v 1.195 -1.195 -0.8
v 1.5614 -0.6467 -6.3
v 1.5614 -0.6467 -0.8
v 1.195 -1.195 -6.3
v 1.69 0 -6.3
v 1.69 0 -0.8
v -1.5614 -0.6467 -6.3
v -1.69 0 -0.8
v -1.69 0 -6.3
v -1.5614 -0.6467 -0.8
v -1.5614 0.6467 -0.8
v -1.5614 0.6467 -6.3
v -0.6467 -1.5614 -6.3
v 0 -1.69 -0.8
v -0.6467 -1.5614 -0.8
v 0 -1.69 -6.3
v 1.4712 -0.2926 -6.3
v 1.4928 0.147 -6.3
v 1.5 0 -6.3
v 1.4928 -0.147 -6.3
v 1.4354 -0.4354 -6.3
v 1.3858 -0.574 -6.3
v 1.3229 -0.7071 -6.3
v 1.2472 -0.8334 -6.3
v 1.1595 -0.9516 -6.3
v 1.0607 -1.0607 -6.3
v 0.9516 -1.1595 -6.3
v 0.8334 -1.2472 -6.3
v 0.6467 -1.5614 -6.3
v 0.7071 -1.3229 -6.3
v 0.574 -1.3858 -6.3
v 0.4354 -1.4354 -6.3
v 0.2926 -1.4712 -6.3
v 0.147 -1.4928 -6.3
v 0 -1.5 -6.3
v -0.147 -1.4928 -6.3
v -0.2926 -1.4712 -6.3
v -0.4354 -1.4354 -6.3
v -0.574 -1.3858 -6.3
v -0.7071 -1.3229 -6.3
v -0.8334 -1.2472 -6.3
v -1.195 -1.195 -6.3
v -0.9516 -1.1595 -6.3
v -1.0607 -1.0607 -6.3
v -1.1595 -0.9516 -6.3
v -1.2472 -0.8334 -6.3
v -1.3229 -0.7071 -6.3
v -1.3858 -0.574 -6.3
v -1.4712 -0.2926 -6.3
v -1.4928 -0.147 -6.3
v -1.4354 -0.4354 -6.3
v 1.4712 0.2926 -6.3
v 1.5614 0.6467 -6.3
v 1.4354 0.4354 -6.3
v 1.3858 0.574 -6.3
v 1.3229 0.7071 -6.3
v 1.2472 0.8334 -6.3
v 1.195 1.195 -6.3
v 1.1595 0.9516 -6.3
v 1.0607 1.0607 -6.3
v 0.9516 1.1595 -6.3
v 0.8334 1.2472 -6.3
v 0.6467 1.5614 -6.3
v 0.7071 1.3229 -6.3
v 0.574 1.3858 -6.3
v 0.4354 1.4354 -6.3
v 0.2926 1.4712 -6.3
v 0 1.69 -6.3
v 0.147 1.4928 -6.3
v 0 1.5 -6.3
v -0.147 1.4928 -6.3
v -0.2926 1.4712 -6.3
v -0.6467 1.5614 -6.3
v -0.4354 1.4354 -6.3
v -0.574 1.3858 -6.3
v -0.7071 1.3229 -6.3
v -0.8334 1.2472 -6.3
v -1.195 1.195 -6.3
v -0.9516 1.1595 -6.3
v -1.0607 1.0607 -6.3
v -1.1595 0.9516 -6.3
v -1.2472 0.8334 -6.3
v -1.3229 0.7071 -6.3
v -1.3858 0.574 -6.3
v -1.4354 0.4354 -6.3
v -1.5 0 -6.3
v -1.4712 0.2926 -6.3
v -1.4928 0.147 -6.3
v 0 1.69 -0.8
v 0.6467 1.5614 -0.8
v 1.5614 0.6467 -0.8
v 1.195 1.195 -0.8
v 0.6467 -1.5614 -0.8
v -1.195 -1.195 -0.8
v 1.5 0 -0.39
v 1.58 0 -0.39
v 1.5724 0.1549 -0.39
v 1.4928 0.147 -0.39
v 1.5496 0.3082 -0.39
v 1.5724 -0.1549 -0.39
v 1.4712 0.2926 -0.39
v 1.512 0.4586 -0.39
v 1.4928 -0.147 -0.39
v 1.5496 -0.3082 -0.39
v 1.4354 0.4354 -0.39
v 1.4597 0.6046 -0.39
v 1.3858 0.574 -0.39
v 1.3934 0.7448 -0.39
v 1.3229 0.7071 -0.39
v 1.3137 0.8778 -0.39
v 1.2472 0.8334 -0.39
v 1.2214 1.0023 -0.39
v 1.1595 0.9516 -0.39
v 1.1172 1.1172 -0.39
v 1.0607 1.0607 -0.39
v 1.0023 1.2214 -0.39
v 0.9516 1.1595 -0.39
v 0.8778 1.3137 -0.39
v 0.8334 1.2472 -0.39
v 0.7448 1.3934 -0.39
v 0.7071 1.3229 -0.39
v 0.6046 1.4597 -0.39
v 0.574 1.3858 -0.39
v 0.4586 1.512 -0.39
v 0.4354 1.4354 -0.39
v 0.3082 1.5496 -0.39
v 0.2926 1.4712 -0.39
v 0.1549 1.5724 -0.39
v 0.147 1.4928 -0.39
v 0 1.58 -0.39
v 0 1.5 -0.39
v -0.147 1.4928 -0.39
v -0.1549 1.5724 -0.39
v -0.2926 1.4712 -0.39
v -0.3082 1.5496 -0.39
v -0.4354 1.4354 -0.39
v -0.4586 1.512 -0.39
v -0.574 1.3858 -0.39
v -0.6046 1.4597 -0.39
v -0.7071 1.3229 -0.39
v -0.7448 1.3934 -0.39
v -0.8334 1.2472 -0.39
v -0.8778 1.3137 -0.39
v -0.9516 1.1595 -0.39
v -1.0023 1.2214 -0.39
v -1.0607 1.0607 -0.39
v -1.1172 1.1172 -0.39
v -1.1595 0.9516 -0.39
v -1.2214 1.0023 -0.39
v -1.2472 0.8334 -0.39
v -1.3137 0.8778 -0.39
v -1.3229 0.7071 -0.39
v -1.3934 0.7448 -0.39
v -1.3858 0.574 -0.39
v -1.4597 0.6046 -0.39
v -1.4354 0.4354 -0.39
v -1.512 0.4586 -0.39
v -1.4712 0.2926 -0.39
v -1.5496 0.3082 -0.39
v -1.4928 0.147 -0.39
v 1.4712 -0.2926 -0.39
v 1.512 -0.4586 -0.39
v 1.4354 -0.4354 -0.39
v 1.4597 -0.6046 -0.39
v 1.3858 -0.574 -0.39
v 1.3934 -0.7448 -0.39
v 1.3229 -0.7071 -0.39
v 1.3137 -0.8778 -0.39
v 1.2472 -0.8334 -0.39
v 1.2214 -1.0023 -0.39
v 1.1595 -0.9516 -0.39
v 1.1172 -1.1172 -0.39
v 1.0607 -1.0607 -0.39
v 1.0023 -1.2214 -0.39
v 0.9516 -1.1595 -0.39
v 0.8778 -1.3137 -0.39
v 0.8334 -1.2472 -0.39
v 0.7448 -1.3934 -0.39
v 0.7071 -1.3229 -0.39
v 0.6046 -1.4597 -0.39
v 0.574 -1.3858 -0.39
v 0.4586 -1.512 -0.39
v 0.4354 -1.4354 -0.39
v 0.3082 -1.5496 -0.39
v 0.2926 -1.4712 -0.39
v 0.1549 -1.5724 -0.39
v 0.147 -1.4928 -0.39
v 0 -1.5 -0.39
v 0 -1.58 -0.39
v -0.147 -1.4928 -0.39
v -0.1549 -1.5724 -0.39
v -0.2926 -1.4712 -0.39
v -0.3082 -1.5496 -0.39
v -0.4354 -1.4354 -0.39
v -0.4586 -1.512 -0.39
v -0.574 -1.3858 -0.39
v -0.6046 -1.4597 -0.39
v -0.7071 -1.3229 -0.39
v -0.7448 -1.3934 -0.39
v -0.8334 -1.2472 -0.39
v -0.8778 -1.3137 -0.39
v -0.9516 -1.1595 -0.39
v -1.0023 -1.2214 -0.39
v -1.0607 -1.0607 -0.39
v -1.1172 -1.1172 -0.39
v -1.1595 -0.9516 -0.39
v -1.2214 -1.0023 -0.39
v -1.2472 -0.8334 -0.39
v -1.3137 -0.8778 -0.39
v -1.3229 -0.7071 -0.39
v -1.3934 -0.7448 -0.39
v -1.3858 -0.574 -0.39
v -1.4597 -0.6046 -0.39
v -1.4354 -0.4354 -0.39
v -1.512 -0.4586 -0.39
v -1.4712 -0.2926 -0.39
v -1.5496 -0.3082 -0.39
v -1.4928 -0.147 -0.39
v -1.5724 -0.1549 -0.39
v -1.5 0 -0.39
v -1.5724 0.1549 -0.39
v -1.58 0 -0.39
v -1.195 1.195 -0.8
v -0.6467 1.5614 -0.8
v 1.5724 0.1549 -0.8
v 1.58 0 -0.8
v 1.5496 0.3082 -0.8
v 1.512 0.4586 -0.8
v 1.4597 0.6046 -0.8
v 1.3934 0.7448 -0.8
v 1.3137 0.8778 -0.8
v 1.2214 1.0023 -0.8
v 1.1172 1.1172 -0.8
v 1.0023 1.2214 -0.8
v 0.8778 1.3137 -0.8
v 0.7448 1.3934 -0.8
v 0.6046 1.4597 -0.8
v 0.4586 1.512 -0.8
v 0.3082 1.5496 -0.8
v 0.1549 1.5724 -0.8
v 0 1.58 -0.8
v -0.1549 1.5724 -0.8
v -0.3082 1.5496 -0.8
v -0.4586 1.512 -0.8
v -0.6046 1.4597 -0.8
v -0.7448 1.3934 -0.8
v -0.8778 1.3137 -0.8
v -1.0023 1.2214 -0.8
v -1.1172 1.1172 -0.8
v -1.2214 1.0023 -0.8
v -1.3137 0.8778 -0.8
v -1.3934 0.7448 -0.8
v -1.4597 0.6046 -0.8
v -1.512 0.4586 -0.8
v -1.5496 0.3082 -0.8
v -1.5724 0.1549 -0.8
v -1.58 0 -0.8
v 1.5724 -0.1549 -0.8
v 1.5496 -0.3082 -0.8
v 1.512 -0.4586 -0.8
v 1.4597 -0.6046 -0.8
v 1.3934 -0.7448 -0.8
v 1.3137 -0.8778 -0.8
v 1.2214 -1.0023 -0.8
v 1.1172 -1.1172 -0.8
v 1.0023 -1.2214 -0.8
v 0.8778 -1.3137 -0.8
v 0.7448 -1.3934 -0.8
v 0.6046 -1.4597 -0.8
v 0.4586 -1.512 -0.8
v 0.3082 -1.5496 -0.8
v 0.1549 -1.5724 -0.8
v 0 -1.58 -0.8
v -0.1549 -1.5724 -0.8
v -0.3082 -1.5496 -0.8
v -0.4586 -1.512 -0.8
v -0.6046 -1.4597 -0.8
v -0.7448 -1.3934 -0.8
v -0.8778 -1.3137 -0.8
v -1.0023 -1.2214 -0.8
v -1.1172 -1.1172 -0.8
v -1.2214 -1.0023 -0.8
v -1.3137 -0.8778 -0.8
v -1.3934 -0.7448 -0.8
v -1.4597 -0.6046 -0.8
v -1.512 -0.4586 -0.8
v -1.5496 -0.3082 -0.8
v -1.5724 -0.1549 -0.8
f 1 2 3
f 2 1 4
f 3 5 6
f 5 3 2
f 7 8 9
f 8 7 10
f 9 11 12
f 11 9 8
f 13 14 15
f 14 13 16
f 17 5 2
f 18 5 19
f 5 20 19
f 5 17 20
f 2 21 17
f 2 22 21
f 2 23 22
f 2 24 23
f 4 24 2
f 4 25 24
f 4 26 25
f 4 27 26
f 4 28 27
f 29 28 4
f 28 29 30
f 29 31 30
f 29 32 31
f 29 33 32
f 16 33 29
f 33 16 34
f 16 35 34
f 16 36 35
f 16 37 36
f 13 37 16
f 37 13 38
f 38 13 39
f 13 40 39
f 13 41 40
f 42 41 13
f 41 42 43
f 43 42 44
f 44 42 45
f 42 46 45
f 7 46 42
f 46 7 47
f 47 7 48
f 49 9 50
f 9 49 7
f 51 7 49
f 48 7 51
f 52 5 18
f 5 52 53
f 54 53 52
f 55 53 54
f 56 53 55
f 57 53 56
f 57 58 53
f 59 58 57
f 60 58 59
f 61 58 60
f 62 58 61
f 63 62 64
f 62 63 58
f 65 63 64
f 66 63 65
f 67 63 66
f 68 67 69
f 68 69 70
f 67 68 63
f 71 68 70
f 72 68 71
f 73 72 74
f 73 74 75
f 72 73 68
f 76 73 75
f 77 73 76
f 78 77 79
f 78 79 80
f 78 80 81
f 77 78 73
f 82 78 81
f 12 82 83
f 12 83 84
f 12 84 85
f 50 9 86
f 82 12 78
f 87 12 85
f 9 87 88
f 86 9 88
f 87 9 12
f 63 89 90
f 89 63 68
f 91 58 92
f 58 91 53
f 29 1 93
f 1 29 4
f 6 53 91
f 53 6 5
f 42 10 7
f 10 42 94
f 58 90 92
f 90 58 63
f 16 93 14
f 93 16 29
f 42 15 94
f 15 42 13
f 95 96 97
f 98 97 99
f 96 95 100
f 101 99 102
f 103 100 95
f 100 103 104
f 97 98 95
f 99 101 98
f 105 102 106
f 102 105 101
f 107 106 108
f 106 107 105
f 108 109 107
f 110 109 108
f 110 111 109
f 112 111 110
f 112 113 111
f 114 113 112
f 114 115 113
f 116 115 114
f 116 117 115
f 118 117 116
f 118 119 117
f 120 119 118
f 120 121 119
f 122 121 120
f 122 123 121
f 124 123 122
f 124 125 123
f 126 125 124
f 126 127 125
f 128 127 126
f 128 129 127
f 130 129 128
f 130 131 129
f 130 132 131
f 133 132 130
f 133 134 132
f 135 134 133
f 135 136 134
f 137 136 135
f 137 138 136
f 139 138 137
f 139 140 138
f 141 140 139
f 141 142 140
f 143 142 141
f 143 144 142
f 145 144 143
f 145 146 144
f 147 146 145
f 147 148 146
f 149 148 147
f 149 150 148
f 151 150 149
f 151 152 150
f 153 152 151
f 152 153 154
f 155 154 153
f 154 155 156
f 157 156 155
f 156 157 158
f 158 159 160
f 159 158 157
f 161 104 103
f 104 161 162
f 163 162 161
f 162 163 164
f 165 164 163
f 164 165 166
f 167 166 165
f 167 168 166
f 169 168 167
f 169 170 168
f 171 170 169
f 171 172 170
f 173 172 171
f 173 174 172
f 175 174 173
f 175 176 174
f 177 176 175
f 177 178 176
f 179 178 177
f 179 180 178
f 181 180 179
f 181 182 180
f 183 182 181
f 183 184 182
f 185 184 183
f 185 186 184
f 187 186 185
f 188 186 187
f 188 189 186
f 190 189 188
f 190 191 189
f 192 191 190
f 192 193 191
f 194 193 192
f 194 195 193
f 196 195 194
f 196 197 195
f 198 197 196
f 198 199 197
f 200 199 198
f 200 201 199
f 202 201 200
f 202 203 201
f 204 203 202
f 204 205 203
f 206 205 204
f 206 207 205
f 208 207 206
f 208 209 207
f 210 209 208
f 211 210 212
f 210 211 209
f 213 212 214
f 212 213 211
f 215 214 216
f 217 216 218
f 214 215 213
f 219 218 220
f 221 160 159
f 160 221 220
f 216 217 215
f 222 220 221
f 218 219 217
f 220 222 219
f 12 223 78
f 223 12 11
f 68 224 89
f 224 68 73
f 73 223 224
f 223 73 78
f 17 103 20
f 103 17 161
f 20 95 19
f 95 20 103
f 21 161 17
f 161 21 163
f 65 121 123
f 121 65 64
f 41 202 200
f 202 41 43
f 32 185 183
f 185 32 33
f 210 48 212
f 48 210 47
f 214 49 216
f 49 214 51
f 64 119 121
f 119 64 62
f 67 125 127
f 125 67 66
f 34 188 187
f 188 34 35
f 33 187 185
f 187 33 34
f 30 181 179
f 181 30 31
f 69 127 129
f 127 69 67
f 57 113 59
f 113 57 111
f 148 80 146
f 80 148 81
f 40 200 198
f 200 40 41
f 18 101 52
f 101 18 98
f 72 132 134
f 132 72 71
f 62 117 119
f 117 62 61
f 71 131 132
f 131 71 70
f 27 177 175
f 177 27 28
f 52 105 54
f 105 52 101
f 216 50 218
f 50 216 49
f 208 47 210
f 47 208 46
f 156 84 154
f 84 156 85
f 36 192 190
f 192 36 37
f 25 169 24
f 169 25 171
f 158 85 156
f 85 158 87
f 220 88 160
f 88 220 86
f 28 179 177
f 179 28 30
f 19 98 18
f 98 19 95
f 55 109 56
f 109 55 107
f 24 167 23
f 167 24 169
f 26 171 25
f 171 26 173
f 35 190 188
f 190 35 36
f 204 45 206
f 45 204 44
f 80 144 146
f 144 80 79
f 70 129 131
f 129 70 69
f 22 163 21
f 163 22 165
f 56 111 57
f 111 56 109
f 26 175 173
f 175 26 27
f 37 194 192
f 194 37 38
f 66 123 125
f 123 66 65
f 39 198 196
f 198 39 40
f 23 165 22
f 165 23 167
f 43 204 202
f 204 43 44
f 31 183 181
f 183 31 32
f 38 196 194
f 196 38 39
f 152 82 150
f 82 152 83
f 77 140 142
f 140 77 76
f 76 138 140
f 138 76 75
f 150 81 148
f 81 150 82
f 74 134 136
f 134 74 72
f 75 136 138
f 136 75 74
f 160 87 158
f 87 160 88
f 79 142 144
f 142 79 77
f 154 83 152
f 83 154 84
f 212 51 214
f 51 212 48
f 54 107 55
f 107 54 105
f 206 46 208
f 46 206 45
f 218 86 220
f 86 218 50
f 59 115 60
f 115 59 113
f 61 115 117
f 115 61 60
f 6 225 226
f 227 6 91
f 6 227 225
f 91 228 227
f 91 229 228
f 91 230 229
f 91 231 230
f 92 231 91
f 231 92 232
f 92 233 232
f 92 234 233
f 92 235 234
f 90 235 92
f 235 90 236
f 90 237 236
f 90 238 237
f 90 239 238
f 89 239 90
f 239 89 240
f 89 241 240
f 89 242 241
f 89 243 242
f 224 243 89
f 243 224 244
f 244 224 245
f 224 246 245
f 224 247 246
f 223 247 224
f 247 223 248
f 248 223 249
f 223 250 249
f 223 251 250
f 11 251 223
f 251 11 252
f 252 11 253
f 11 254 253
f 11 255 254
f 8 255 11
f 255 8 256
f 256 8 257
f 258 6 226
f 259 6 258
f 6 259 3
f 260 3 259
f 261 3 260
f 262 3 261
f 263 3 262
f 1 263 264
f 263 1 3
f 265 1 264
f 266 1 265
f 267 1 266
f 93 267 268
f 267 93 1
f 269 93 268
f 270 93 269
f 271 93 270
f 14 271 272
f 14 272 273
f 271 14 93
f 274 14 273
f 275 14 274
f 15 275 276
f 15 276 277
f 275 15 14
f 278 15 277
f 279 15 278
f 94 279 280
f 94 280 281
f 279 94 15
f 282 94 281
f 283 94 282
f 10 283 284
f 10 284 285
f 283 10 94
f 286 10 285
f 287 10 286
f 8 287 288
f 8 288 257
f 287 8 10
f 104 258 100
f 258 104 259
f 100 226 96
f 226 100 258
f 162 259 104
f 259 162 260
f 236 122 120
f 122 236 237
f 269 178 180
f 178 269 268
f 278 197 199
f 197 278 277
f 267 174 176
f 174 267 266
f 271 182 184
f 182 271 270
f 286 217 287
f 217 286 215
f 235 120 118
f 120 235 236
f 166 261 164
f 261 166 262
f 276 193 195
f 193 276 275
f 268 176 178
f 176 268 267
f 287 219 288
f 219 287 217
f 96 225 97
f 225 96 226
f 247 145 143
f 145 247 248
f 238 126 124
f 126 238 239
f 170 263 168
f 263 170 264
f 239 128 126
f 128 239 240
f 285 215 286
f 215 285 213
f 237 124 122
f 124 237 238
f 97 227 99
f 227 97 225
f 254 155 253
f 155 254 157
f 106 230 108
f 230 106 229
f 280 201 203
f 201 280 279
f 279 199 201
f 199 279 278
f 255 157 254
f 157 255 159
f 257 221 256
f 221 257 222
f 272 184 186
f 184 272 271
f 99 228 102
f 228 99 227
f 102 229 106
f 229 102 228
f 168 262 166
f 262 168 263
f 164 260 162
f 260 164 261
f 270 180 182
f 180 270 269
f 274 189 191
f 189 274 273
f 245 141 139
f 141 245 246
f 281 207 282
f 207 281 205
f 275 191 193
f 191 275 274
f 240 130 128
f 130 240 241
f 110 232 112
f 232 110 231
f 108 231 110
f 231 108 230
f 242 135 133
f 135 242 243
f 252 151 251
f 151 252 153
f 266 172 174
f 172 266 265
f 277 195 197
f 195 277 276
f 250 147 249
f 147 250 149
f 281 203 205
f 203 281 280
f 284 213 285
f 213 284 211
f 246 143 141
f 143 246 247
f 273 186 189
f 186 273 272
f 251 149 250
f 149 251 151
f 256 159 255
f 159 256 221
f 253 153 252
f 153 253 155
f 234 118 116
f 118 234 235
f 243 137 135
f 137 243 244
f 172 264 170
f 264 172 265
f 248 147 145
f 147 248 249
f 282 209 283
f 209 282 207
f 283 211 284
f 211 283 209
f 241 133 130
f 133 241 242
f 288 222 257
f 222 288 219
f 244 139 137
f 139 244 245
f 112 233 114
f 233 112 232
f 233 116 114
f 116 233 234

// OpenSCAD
//Module cyndrical section

//Center section/Cylinder
rotate([180,0,0]){
difference(){
translate([0,0,0.39]){
difference(){
difference(){
    //outer case of the cylinder
    cylinder(h = 5.91, r = 1.69, $fn=16);
    //inner smooth part of the cylinder
    translate([0,0,-0.05]){
    cylinder(h = 6.0, r = 1.5, $fn=64);
    }
}
}
}

//Outer trade maker section
translate([0,0,0.38]){
    difference(){
difference(){
    //outer case of the cylinder
    cylinder(h = 0.42, r = 2);
    //inner smooth part of the cylinder
    translate([0,0,-0.2]){
    cylinder(h = 1, r = 1.58, $fn=64);
    }
}
}
}
}
}
